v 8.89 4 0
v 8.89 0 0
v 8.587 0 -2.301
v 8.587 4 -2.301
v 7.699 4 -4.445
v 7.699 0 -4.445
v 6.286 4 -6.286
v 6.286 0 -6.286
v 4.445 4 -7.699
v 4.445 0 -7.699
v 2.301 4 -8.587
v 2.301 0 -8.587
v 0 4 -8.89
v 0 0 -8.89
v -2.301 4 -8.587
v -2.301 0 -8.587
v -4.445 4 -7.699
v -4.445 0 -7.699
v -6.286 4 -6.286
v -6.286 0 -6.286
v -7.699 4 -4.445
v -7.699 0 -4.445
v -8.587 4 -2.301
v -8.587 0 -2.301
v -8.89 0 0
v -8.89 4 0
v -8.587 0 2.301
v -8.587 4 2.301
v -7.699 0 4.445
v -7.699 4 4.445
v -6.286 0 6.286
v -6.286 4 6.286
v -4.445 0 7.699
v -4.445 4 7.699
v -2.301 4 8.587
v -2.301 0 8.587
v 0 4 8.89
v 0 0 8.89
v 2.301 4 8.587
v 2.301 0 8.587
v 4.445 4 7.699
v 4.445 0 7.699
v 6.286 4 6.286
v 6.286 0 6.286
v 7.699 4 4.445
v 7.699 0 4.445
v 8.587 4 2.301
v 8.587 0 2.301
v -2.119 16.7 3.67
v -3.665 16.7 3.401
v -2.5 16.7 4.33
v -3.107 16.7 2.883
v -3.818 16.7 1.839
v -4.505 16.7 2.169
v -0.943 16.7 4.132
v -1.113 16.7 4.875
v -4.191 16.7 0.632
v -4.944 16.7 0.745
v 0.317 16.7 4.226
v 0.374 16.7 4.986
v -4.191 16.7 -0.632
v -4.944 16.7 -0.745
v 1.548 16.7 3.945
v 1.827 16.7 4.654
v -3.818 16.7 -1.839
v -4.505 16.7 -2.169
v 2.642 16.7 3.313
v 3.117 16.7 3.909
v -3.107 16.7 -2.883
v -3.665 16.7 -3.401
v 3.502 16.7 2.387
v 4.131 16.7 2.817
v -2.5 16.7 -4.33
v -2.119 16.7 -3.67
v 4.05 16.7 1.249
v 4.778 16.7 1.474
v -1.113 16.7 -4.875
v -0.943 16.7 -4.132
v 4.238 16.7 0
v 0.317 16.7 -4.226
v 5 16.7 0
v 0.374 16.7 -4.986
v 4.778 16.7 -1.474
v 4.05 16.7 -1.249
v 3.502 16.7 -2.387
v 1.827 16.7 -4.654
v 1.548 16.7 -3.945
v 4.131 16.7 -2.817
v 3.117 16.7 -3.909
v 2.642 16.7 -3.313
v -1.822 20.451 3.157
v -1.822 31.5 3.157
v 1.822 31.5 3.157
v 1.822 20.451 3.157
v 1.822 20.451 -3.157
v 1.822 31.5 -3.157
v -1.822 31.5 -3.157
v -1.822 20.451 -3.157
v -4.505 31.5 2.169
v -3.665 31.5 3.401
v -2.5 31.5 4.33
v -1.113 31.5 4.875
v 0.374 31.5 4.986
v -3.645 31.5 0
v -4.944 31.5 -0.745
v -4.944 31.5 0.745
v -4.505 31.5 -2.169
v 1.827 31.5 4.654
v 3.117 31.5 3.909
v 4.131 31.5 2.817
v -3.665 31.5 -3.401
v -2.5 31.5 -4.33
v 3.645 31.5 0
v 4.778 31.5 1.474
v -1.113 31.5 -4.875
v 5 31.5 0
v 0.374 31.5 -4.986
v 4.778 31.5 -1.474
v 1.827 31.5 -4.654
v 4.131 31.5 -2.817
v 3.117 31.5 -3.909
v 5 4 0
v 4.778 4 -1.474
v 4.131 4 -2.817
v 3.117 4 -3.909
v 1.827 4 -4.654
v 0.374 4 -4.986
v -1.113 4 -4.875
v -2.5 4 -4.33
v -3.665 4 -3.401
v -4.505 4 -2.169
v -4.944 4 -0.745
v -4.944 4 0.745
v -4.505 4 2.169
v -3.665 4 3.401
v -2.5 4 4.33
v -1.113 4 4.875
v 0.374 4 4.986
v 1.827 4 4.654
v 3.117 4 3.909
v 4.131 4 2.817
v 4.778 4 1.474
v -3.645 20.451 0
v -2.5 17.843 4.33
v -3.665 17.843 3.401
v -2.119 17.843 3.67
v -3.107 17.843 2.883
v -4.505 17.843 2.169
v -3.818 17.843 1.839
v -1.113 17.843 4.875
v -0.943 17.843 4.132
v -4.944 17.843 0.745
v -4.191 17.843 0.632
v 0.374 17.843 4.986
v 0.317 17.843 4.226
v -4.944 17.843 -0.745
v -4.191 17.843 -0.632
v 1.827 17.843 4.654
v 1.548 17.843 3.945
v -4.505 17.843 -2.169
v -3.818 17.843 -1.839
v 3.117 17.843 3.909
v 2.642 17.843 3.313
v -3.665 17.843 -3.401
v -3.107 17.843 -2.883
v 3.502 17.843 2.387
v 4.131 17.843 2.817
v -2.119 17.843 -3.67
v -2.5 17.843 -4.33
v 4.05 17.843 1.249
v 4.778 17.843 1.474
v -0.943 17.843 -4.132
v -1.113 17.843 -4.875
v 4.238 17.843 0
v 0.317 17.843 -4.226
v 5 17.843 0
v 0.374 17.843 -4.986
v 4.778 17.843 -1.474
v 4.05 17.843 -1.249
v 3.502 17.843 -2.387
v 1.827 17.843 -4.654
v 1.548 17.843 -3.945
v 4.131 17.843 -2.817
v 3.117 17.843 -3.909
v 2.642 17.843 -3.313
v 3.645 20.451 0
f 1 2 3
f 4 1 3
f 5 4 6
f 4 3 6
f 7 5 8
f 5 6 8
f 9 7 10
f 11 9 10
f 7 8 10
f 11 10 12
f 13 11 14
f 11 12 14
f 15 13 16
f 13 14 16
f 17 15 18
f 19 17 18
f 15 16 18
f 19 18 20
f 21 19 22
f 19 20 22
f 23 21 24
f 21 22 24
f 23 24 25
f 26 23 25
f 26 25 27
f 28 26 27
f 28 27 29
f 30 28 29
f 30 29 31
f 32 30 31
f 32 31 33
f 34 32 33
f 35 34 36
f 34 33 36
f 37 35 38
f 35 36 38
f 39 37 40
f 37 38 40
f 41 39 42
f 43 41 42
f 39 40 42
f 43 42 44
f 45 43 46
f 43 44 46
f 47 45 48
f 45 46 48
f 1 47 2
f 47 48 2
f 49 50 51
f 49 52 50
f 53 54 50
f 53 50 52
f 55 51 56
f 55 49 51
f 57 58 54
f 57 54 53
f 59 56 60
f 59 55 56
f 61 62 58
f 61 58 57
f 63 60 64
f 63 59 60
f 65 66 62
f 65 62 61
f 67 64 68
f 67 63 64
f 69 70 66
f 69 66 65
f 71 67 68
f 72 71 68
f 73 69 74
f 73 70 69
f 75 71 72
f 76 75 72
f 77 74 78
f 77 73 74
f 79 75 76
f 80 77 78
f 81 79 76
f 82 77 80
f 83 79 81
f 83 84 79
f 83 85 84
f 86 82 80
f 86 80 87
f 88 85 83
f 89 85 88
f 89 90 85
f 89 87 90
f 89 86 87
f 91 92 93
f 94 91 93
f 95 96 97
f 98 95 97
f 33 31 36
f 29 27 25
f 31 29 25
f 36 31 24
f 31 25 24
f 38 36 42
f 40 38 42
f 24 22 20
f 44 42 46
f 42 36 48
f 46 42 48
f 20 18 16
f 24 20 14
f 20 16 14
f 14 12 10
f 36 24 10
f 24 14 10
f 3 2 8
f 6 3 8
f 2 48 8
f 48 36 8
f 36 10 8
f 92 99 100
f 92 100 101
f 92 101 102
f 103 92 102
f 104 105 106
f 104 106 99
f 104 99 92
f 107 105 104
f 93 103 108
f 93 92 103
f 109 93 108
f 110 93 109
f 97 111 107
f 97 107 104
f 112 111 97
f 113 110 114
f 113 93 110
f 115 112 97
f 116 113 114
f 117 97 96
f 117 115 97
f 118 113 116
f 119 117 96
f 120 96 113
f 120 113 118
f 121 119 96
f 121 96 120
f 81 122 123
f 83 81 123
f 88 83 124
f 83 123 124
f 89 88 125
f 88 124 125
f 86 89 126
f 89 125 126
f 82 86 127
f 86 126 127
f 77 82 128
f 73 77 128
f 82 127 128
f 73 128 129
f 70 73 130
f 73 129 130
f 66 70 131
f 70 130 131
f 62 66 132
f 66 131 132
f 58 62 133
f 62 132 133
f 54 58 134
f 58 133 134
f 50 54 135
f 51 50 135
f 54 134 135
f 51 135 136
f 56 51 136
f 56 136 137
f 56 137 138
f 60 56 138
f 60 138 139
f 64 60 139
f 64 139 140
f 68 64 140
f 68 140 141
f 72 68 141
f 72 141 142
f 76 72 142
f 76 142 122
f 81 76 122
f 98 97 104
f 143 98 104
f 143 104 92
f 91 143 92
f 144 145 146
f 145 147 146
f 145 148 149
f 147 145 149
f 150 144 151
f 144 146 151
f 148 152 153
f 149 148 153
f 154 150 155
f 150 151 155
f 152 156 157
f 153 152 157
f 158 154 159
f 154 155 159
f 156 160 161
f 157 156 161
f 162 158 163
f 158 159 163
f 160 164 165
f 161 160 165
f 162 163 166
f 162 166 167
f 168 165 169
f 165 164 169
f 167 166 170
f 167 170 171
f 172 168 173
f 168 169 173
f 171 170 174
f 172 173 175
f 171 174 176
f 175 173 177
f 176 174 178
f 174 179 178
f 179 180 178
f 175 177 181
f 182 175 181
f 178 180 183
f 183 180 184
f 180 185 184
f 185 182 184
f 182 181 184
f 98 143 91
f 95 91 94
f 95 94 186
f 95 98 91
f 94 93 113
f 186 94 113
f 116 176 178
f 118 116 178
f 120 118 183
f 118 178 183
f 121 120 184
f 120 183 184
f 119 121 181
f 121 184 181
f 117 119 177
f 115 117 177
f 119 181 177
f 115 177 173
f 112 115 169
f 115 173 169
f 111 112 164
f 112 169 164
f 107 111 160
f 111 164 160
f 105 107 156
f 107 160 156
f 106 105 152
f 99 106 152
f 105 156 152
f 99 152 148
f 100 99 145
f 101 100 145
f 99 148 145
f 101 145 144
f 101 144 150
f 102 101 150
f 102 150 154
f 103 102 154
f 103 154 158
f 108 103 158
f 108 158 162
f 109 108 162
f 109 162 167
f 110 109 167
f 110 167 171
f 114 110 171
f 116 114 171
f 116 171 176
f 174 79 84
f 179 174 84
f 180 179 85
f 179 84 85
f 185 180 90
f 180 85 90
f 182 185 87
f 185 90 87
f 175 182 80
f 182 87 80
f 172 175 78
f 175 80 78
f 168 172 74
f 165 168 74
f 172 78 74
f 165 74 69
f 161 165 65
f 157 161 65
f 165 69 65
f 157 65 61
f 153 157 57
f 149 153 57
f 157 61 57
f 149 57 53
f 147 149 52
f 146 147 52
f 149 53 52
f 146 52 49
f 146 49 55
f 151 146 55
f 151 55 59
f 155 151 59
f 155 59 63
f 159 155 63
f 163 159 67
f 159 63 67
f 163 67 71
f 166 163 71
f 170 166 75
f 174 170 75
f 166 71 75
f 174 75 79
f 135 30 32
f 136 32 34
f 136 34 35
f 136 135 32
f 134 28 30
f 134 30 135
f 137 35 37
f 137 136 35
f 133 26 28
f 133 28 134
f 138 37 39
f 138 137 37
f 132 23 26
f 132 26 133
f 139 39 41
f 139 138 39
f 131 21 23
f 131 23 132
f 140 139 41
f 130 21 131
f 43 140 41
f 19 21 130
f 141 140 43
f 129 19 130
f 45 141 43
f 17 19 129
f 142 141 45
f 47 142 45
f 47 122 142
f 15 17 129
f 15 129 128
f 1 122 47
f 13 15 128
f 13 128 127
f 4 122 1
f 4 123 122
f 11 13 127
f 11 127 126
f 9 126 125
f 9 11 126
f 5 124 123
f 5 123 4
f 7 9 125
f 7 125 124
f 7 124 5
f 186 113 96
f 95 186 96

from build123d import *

# Parameters (mm, degrees)
SKETCH1_R                                     = 8.89
TRAINGULAR_BASE_SIMPLIFIED_TO_CIRCLE_HE_DEPTH = 4
SKETCH2_R                                     = 5
DRIVE_SHAFT_DEPTH                             = 27.5
SKETCH4_R                                     = 5
SKETCH4_R_2                                   = 4.238
RETAINING_RING_SLOT_DEPTH                     = 1.143
HEX_SLOT_DEPTH                                = 11.049


with BuildPart() as part:
    # Sketch1 → Traingular base (simplified to circle here) (new body)
    with BuildSketch(Plane(origin=(0, 0, 0), x_dir=(1, 0, 0), z_dir=(0, 1, 0))):
        Circle(SKETCH1_R)
    extrude(amount=TRAINGULAR_BASE_SIMPLIFIED_TO_CIRCLE_HE_DEPTH)

    # Sketch2 → Drive shaft (add)
    with BuildSketch(Plane(origin=(0, 4, 0), x_dir=(1, 0, 0), z_dir=(0, 1, 0))):
        Circle(SKETCH2_R)
    extrude(amount=DRIVE_SHAFT_DEPTH)

    # Sketch4 → Retaining ring slot (cut)
    with BuildSketch(Plane(origin=(0, 16.7, 0), x_dir=(1, 0, 0), z_dir=(0, 1, 0))):
        Circle(SKETCH4_R)
        Circle(SKETCH4_R_2, mode=Mode.SUBTRACT)
    extrude(amount=RETAINING_RING_SLOT_DEPTH, mode=Mode.SUBTRACT)

    # Sketch5 → Hex slot (cut)
    with BuildSketch(Plane(origin=(0, 31.5, 0), x_dir=(1, 0, 0), z_dir=(0, 1, 0))):
        Polygon((3.6449, 0), (1.82245, 3.156575994), (-1.82245, 3.156575994), (-3.6449, 0), (-1.82245, -3.156575994), (1.82245, -3.156575994), align=None)
    extrude(amount=-HEX_SLOT_DEPTH, mode=Mode.SUBTRACT)


solid = part.part
